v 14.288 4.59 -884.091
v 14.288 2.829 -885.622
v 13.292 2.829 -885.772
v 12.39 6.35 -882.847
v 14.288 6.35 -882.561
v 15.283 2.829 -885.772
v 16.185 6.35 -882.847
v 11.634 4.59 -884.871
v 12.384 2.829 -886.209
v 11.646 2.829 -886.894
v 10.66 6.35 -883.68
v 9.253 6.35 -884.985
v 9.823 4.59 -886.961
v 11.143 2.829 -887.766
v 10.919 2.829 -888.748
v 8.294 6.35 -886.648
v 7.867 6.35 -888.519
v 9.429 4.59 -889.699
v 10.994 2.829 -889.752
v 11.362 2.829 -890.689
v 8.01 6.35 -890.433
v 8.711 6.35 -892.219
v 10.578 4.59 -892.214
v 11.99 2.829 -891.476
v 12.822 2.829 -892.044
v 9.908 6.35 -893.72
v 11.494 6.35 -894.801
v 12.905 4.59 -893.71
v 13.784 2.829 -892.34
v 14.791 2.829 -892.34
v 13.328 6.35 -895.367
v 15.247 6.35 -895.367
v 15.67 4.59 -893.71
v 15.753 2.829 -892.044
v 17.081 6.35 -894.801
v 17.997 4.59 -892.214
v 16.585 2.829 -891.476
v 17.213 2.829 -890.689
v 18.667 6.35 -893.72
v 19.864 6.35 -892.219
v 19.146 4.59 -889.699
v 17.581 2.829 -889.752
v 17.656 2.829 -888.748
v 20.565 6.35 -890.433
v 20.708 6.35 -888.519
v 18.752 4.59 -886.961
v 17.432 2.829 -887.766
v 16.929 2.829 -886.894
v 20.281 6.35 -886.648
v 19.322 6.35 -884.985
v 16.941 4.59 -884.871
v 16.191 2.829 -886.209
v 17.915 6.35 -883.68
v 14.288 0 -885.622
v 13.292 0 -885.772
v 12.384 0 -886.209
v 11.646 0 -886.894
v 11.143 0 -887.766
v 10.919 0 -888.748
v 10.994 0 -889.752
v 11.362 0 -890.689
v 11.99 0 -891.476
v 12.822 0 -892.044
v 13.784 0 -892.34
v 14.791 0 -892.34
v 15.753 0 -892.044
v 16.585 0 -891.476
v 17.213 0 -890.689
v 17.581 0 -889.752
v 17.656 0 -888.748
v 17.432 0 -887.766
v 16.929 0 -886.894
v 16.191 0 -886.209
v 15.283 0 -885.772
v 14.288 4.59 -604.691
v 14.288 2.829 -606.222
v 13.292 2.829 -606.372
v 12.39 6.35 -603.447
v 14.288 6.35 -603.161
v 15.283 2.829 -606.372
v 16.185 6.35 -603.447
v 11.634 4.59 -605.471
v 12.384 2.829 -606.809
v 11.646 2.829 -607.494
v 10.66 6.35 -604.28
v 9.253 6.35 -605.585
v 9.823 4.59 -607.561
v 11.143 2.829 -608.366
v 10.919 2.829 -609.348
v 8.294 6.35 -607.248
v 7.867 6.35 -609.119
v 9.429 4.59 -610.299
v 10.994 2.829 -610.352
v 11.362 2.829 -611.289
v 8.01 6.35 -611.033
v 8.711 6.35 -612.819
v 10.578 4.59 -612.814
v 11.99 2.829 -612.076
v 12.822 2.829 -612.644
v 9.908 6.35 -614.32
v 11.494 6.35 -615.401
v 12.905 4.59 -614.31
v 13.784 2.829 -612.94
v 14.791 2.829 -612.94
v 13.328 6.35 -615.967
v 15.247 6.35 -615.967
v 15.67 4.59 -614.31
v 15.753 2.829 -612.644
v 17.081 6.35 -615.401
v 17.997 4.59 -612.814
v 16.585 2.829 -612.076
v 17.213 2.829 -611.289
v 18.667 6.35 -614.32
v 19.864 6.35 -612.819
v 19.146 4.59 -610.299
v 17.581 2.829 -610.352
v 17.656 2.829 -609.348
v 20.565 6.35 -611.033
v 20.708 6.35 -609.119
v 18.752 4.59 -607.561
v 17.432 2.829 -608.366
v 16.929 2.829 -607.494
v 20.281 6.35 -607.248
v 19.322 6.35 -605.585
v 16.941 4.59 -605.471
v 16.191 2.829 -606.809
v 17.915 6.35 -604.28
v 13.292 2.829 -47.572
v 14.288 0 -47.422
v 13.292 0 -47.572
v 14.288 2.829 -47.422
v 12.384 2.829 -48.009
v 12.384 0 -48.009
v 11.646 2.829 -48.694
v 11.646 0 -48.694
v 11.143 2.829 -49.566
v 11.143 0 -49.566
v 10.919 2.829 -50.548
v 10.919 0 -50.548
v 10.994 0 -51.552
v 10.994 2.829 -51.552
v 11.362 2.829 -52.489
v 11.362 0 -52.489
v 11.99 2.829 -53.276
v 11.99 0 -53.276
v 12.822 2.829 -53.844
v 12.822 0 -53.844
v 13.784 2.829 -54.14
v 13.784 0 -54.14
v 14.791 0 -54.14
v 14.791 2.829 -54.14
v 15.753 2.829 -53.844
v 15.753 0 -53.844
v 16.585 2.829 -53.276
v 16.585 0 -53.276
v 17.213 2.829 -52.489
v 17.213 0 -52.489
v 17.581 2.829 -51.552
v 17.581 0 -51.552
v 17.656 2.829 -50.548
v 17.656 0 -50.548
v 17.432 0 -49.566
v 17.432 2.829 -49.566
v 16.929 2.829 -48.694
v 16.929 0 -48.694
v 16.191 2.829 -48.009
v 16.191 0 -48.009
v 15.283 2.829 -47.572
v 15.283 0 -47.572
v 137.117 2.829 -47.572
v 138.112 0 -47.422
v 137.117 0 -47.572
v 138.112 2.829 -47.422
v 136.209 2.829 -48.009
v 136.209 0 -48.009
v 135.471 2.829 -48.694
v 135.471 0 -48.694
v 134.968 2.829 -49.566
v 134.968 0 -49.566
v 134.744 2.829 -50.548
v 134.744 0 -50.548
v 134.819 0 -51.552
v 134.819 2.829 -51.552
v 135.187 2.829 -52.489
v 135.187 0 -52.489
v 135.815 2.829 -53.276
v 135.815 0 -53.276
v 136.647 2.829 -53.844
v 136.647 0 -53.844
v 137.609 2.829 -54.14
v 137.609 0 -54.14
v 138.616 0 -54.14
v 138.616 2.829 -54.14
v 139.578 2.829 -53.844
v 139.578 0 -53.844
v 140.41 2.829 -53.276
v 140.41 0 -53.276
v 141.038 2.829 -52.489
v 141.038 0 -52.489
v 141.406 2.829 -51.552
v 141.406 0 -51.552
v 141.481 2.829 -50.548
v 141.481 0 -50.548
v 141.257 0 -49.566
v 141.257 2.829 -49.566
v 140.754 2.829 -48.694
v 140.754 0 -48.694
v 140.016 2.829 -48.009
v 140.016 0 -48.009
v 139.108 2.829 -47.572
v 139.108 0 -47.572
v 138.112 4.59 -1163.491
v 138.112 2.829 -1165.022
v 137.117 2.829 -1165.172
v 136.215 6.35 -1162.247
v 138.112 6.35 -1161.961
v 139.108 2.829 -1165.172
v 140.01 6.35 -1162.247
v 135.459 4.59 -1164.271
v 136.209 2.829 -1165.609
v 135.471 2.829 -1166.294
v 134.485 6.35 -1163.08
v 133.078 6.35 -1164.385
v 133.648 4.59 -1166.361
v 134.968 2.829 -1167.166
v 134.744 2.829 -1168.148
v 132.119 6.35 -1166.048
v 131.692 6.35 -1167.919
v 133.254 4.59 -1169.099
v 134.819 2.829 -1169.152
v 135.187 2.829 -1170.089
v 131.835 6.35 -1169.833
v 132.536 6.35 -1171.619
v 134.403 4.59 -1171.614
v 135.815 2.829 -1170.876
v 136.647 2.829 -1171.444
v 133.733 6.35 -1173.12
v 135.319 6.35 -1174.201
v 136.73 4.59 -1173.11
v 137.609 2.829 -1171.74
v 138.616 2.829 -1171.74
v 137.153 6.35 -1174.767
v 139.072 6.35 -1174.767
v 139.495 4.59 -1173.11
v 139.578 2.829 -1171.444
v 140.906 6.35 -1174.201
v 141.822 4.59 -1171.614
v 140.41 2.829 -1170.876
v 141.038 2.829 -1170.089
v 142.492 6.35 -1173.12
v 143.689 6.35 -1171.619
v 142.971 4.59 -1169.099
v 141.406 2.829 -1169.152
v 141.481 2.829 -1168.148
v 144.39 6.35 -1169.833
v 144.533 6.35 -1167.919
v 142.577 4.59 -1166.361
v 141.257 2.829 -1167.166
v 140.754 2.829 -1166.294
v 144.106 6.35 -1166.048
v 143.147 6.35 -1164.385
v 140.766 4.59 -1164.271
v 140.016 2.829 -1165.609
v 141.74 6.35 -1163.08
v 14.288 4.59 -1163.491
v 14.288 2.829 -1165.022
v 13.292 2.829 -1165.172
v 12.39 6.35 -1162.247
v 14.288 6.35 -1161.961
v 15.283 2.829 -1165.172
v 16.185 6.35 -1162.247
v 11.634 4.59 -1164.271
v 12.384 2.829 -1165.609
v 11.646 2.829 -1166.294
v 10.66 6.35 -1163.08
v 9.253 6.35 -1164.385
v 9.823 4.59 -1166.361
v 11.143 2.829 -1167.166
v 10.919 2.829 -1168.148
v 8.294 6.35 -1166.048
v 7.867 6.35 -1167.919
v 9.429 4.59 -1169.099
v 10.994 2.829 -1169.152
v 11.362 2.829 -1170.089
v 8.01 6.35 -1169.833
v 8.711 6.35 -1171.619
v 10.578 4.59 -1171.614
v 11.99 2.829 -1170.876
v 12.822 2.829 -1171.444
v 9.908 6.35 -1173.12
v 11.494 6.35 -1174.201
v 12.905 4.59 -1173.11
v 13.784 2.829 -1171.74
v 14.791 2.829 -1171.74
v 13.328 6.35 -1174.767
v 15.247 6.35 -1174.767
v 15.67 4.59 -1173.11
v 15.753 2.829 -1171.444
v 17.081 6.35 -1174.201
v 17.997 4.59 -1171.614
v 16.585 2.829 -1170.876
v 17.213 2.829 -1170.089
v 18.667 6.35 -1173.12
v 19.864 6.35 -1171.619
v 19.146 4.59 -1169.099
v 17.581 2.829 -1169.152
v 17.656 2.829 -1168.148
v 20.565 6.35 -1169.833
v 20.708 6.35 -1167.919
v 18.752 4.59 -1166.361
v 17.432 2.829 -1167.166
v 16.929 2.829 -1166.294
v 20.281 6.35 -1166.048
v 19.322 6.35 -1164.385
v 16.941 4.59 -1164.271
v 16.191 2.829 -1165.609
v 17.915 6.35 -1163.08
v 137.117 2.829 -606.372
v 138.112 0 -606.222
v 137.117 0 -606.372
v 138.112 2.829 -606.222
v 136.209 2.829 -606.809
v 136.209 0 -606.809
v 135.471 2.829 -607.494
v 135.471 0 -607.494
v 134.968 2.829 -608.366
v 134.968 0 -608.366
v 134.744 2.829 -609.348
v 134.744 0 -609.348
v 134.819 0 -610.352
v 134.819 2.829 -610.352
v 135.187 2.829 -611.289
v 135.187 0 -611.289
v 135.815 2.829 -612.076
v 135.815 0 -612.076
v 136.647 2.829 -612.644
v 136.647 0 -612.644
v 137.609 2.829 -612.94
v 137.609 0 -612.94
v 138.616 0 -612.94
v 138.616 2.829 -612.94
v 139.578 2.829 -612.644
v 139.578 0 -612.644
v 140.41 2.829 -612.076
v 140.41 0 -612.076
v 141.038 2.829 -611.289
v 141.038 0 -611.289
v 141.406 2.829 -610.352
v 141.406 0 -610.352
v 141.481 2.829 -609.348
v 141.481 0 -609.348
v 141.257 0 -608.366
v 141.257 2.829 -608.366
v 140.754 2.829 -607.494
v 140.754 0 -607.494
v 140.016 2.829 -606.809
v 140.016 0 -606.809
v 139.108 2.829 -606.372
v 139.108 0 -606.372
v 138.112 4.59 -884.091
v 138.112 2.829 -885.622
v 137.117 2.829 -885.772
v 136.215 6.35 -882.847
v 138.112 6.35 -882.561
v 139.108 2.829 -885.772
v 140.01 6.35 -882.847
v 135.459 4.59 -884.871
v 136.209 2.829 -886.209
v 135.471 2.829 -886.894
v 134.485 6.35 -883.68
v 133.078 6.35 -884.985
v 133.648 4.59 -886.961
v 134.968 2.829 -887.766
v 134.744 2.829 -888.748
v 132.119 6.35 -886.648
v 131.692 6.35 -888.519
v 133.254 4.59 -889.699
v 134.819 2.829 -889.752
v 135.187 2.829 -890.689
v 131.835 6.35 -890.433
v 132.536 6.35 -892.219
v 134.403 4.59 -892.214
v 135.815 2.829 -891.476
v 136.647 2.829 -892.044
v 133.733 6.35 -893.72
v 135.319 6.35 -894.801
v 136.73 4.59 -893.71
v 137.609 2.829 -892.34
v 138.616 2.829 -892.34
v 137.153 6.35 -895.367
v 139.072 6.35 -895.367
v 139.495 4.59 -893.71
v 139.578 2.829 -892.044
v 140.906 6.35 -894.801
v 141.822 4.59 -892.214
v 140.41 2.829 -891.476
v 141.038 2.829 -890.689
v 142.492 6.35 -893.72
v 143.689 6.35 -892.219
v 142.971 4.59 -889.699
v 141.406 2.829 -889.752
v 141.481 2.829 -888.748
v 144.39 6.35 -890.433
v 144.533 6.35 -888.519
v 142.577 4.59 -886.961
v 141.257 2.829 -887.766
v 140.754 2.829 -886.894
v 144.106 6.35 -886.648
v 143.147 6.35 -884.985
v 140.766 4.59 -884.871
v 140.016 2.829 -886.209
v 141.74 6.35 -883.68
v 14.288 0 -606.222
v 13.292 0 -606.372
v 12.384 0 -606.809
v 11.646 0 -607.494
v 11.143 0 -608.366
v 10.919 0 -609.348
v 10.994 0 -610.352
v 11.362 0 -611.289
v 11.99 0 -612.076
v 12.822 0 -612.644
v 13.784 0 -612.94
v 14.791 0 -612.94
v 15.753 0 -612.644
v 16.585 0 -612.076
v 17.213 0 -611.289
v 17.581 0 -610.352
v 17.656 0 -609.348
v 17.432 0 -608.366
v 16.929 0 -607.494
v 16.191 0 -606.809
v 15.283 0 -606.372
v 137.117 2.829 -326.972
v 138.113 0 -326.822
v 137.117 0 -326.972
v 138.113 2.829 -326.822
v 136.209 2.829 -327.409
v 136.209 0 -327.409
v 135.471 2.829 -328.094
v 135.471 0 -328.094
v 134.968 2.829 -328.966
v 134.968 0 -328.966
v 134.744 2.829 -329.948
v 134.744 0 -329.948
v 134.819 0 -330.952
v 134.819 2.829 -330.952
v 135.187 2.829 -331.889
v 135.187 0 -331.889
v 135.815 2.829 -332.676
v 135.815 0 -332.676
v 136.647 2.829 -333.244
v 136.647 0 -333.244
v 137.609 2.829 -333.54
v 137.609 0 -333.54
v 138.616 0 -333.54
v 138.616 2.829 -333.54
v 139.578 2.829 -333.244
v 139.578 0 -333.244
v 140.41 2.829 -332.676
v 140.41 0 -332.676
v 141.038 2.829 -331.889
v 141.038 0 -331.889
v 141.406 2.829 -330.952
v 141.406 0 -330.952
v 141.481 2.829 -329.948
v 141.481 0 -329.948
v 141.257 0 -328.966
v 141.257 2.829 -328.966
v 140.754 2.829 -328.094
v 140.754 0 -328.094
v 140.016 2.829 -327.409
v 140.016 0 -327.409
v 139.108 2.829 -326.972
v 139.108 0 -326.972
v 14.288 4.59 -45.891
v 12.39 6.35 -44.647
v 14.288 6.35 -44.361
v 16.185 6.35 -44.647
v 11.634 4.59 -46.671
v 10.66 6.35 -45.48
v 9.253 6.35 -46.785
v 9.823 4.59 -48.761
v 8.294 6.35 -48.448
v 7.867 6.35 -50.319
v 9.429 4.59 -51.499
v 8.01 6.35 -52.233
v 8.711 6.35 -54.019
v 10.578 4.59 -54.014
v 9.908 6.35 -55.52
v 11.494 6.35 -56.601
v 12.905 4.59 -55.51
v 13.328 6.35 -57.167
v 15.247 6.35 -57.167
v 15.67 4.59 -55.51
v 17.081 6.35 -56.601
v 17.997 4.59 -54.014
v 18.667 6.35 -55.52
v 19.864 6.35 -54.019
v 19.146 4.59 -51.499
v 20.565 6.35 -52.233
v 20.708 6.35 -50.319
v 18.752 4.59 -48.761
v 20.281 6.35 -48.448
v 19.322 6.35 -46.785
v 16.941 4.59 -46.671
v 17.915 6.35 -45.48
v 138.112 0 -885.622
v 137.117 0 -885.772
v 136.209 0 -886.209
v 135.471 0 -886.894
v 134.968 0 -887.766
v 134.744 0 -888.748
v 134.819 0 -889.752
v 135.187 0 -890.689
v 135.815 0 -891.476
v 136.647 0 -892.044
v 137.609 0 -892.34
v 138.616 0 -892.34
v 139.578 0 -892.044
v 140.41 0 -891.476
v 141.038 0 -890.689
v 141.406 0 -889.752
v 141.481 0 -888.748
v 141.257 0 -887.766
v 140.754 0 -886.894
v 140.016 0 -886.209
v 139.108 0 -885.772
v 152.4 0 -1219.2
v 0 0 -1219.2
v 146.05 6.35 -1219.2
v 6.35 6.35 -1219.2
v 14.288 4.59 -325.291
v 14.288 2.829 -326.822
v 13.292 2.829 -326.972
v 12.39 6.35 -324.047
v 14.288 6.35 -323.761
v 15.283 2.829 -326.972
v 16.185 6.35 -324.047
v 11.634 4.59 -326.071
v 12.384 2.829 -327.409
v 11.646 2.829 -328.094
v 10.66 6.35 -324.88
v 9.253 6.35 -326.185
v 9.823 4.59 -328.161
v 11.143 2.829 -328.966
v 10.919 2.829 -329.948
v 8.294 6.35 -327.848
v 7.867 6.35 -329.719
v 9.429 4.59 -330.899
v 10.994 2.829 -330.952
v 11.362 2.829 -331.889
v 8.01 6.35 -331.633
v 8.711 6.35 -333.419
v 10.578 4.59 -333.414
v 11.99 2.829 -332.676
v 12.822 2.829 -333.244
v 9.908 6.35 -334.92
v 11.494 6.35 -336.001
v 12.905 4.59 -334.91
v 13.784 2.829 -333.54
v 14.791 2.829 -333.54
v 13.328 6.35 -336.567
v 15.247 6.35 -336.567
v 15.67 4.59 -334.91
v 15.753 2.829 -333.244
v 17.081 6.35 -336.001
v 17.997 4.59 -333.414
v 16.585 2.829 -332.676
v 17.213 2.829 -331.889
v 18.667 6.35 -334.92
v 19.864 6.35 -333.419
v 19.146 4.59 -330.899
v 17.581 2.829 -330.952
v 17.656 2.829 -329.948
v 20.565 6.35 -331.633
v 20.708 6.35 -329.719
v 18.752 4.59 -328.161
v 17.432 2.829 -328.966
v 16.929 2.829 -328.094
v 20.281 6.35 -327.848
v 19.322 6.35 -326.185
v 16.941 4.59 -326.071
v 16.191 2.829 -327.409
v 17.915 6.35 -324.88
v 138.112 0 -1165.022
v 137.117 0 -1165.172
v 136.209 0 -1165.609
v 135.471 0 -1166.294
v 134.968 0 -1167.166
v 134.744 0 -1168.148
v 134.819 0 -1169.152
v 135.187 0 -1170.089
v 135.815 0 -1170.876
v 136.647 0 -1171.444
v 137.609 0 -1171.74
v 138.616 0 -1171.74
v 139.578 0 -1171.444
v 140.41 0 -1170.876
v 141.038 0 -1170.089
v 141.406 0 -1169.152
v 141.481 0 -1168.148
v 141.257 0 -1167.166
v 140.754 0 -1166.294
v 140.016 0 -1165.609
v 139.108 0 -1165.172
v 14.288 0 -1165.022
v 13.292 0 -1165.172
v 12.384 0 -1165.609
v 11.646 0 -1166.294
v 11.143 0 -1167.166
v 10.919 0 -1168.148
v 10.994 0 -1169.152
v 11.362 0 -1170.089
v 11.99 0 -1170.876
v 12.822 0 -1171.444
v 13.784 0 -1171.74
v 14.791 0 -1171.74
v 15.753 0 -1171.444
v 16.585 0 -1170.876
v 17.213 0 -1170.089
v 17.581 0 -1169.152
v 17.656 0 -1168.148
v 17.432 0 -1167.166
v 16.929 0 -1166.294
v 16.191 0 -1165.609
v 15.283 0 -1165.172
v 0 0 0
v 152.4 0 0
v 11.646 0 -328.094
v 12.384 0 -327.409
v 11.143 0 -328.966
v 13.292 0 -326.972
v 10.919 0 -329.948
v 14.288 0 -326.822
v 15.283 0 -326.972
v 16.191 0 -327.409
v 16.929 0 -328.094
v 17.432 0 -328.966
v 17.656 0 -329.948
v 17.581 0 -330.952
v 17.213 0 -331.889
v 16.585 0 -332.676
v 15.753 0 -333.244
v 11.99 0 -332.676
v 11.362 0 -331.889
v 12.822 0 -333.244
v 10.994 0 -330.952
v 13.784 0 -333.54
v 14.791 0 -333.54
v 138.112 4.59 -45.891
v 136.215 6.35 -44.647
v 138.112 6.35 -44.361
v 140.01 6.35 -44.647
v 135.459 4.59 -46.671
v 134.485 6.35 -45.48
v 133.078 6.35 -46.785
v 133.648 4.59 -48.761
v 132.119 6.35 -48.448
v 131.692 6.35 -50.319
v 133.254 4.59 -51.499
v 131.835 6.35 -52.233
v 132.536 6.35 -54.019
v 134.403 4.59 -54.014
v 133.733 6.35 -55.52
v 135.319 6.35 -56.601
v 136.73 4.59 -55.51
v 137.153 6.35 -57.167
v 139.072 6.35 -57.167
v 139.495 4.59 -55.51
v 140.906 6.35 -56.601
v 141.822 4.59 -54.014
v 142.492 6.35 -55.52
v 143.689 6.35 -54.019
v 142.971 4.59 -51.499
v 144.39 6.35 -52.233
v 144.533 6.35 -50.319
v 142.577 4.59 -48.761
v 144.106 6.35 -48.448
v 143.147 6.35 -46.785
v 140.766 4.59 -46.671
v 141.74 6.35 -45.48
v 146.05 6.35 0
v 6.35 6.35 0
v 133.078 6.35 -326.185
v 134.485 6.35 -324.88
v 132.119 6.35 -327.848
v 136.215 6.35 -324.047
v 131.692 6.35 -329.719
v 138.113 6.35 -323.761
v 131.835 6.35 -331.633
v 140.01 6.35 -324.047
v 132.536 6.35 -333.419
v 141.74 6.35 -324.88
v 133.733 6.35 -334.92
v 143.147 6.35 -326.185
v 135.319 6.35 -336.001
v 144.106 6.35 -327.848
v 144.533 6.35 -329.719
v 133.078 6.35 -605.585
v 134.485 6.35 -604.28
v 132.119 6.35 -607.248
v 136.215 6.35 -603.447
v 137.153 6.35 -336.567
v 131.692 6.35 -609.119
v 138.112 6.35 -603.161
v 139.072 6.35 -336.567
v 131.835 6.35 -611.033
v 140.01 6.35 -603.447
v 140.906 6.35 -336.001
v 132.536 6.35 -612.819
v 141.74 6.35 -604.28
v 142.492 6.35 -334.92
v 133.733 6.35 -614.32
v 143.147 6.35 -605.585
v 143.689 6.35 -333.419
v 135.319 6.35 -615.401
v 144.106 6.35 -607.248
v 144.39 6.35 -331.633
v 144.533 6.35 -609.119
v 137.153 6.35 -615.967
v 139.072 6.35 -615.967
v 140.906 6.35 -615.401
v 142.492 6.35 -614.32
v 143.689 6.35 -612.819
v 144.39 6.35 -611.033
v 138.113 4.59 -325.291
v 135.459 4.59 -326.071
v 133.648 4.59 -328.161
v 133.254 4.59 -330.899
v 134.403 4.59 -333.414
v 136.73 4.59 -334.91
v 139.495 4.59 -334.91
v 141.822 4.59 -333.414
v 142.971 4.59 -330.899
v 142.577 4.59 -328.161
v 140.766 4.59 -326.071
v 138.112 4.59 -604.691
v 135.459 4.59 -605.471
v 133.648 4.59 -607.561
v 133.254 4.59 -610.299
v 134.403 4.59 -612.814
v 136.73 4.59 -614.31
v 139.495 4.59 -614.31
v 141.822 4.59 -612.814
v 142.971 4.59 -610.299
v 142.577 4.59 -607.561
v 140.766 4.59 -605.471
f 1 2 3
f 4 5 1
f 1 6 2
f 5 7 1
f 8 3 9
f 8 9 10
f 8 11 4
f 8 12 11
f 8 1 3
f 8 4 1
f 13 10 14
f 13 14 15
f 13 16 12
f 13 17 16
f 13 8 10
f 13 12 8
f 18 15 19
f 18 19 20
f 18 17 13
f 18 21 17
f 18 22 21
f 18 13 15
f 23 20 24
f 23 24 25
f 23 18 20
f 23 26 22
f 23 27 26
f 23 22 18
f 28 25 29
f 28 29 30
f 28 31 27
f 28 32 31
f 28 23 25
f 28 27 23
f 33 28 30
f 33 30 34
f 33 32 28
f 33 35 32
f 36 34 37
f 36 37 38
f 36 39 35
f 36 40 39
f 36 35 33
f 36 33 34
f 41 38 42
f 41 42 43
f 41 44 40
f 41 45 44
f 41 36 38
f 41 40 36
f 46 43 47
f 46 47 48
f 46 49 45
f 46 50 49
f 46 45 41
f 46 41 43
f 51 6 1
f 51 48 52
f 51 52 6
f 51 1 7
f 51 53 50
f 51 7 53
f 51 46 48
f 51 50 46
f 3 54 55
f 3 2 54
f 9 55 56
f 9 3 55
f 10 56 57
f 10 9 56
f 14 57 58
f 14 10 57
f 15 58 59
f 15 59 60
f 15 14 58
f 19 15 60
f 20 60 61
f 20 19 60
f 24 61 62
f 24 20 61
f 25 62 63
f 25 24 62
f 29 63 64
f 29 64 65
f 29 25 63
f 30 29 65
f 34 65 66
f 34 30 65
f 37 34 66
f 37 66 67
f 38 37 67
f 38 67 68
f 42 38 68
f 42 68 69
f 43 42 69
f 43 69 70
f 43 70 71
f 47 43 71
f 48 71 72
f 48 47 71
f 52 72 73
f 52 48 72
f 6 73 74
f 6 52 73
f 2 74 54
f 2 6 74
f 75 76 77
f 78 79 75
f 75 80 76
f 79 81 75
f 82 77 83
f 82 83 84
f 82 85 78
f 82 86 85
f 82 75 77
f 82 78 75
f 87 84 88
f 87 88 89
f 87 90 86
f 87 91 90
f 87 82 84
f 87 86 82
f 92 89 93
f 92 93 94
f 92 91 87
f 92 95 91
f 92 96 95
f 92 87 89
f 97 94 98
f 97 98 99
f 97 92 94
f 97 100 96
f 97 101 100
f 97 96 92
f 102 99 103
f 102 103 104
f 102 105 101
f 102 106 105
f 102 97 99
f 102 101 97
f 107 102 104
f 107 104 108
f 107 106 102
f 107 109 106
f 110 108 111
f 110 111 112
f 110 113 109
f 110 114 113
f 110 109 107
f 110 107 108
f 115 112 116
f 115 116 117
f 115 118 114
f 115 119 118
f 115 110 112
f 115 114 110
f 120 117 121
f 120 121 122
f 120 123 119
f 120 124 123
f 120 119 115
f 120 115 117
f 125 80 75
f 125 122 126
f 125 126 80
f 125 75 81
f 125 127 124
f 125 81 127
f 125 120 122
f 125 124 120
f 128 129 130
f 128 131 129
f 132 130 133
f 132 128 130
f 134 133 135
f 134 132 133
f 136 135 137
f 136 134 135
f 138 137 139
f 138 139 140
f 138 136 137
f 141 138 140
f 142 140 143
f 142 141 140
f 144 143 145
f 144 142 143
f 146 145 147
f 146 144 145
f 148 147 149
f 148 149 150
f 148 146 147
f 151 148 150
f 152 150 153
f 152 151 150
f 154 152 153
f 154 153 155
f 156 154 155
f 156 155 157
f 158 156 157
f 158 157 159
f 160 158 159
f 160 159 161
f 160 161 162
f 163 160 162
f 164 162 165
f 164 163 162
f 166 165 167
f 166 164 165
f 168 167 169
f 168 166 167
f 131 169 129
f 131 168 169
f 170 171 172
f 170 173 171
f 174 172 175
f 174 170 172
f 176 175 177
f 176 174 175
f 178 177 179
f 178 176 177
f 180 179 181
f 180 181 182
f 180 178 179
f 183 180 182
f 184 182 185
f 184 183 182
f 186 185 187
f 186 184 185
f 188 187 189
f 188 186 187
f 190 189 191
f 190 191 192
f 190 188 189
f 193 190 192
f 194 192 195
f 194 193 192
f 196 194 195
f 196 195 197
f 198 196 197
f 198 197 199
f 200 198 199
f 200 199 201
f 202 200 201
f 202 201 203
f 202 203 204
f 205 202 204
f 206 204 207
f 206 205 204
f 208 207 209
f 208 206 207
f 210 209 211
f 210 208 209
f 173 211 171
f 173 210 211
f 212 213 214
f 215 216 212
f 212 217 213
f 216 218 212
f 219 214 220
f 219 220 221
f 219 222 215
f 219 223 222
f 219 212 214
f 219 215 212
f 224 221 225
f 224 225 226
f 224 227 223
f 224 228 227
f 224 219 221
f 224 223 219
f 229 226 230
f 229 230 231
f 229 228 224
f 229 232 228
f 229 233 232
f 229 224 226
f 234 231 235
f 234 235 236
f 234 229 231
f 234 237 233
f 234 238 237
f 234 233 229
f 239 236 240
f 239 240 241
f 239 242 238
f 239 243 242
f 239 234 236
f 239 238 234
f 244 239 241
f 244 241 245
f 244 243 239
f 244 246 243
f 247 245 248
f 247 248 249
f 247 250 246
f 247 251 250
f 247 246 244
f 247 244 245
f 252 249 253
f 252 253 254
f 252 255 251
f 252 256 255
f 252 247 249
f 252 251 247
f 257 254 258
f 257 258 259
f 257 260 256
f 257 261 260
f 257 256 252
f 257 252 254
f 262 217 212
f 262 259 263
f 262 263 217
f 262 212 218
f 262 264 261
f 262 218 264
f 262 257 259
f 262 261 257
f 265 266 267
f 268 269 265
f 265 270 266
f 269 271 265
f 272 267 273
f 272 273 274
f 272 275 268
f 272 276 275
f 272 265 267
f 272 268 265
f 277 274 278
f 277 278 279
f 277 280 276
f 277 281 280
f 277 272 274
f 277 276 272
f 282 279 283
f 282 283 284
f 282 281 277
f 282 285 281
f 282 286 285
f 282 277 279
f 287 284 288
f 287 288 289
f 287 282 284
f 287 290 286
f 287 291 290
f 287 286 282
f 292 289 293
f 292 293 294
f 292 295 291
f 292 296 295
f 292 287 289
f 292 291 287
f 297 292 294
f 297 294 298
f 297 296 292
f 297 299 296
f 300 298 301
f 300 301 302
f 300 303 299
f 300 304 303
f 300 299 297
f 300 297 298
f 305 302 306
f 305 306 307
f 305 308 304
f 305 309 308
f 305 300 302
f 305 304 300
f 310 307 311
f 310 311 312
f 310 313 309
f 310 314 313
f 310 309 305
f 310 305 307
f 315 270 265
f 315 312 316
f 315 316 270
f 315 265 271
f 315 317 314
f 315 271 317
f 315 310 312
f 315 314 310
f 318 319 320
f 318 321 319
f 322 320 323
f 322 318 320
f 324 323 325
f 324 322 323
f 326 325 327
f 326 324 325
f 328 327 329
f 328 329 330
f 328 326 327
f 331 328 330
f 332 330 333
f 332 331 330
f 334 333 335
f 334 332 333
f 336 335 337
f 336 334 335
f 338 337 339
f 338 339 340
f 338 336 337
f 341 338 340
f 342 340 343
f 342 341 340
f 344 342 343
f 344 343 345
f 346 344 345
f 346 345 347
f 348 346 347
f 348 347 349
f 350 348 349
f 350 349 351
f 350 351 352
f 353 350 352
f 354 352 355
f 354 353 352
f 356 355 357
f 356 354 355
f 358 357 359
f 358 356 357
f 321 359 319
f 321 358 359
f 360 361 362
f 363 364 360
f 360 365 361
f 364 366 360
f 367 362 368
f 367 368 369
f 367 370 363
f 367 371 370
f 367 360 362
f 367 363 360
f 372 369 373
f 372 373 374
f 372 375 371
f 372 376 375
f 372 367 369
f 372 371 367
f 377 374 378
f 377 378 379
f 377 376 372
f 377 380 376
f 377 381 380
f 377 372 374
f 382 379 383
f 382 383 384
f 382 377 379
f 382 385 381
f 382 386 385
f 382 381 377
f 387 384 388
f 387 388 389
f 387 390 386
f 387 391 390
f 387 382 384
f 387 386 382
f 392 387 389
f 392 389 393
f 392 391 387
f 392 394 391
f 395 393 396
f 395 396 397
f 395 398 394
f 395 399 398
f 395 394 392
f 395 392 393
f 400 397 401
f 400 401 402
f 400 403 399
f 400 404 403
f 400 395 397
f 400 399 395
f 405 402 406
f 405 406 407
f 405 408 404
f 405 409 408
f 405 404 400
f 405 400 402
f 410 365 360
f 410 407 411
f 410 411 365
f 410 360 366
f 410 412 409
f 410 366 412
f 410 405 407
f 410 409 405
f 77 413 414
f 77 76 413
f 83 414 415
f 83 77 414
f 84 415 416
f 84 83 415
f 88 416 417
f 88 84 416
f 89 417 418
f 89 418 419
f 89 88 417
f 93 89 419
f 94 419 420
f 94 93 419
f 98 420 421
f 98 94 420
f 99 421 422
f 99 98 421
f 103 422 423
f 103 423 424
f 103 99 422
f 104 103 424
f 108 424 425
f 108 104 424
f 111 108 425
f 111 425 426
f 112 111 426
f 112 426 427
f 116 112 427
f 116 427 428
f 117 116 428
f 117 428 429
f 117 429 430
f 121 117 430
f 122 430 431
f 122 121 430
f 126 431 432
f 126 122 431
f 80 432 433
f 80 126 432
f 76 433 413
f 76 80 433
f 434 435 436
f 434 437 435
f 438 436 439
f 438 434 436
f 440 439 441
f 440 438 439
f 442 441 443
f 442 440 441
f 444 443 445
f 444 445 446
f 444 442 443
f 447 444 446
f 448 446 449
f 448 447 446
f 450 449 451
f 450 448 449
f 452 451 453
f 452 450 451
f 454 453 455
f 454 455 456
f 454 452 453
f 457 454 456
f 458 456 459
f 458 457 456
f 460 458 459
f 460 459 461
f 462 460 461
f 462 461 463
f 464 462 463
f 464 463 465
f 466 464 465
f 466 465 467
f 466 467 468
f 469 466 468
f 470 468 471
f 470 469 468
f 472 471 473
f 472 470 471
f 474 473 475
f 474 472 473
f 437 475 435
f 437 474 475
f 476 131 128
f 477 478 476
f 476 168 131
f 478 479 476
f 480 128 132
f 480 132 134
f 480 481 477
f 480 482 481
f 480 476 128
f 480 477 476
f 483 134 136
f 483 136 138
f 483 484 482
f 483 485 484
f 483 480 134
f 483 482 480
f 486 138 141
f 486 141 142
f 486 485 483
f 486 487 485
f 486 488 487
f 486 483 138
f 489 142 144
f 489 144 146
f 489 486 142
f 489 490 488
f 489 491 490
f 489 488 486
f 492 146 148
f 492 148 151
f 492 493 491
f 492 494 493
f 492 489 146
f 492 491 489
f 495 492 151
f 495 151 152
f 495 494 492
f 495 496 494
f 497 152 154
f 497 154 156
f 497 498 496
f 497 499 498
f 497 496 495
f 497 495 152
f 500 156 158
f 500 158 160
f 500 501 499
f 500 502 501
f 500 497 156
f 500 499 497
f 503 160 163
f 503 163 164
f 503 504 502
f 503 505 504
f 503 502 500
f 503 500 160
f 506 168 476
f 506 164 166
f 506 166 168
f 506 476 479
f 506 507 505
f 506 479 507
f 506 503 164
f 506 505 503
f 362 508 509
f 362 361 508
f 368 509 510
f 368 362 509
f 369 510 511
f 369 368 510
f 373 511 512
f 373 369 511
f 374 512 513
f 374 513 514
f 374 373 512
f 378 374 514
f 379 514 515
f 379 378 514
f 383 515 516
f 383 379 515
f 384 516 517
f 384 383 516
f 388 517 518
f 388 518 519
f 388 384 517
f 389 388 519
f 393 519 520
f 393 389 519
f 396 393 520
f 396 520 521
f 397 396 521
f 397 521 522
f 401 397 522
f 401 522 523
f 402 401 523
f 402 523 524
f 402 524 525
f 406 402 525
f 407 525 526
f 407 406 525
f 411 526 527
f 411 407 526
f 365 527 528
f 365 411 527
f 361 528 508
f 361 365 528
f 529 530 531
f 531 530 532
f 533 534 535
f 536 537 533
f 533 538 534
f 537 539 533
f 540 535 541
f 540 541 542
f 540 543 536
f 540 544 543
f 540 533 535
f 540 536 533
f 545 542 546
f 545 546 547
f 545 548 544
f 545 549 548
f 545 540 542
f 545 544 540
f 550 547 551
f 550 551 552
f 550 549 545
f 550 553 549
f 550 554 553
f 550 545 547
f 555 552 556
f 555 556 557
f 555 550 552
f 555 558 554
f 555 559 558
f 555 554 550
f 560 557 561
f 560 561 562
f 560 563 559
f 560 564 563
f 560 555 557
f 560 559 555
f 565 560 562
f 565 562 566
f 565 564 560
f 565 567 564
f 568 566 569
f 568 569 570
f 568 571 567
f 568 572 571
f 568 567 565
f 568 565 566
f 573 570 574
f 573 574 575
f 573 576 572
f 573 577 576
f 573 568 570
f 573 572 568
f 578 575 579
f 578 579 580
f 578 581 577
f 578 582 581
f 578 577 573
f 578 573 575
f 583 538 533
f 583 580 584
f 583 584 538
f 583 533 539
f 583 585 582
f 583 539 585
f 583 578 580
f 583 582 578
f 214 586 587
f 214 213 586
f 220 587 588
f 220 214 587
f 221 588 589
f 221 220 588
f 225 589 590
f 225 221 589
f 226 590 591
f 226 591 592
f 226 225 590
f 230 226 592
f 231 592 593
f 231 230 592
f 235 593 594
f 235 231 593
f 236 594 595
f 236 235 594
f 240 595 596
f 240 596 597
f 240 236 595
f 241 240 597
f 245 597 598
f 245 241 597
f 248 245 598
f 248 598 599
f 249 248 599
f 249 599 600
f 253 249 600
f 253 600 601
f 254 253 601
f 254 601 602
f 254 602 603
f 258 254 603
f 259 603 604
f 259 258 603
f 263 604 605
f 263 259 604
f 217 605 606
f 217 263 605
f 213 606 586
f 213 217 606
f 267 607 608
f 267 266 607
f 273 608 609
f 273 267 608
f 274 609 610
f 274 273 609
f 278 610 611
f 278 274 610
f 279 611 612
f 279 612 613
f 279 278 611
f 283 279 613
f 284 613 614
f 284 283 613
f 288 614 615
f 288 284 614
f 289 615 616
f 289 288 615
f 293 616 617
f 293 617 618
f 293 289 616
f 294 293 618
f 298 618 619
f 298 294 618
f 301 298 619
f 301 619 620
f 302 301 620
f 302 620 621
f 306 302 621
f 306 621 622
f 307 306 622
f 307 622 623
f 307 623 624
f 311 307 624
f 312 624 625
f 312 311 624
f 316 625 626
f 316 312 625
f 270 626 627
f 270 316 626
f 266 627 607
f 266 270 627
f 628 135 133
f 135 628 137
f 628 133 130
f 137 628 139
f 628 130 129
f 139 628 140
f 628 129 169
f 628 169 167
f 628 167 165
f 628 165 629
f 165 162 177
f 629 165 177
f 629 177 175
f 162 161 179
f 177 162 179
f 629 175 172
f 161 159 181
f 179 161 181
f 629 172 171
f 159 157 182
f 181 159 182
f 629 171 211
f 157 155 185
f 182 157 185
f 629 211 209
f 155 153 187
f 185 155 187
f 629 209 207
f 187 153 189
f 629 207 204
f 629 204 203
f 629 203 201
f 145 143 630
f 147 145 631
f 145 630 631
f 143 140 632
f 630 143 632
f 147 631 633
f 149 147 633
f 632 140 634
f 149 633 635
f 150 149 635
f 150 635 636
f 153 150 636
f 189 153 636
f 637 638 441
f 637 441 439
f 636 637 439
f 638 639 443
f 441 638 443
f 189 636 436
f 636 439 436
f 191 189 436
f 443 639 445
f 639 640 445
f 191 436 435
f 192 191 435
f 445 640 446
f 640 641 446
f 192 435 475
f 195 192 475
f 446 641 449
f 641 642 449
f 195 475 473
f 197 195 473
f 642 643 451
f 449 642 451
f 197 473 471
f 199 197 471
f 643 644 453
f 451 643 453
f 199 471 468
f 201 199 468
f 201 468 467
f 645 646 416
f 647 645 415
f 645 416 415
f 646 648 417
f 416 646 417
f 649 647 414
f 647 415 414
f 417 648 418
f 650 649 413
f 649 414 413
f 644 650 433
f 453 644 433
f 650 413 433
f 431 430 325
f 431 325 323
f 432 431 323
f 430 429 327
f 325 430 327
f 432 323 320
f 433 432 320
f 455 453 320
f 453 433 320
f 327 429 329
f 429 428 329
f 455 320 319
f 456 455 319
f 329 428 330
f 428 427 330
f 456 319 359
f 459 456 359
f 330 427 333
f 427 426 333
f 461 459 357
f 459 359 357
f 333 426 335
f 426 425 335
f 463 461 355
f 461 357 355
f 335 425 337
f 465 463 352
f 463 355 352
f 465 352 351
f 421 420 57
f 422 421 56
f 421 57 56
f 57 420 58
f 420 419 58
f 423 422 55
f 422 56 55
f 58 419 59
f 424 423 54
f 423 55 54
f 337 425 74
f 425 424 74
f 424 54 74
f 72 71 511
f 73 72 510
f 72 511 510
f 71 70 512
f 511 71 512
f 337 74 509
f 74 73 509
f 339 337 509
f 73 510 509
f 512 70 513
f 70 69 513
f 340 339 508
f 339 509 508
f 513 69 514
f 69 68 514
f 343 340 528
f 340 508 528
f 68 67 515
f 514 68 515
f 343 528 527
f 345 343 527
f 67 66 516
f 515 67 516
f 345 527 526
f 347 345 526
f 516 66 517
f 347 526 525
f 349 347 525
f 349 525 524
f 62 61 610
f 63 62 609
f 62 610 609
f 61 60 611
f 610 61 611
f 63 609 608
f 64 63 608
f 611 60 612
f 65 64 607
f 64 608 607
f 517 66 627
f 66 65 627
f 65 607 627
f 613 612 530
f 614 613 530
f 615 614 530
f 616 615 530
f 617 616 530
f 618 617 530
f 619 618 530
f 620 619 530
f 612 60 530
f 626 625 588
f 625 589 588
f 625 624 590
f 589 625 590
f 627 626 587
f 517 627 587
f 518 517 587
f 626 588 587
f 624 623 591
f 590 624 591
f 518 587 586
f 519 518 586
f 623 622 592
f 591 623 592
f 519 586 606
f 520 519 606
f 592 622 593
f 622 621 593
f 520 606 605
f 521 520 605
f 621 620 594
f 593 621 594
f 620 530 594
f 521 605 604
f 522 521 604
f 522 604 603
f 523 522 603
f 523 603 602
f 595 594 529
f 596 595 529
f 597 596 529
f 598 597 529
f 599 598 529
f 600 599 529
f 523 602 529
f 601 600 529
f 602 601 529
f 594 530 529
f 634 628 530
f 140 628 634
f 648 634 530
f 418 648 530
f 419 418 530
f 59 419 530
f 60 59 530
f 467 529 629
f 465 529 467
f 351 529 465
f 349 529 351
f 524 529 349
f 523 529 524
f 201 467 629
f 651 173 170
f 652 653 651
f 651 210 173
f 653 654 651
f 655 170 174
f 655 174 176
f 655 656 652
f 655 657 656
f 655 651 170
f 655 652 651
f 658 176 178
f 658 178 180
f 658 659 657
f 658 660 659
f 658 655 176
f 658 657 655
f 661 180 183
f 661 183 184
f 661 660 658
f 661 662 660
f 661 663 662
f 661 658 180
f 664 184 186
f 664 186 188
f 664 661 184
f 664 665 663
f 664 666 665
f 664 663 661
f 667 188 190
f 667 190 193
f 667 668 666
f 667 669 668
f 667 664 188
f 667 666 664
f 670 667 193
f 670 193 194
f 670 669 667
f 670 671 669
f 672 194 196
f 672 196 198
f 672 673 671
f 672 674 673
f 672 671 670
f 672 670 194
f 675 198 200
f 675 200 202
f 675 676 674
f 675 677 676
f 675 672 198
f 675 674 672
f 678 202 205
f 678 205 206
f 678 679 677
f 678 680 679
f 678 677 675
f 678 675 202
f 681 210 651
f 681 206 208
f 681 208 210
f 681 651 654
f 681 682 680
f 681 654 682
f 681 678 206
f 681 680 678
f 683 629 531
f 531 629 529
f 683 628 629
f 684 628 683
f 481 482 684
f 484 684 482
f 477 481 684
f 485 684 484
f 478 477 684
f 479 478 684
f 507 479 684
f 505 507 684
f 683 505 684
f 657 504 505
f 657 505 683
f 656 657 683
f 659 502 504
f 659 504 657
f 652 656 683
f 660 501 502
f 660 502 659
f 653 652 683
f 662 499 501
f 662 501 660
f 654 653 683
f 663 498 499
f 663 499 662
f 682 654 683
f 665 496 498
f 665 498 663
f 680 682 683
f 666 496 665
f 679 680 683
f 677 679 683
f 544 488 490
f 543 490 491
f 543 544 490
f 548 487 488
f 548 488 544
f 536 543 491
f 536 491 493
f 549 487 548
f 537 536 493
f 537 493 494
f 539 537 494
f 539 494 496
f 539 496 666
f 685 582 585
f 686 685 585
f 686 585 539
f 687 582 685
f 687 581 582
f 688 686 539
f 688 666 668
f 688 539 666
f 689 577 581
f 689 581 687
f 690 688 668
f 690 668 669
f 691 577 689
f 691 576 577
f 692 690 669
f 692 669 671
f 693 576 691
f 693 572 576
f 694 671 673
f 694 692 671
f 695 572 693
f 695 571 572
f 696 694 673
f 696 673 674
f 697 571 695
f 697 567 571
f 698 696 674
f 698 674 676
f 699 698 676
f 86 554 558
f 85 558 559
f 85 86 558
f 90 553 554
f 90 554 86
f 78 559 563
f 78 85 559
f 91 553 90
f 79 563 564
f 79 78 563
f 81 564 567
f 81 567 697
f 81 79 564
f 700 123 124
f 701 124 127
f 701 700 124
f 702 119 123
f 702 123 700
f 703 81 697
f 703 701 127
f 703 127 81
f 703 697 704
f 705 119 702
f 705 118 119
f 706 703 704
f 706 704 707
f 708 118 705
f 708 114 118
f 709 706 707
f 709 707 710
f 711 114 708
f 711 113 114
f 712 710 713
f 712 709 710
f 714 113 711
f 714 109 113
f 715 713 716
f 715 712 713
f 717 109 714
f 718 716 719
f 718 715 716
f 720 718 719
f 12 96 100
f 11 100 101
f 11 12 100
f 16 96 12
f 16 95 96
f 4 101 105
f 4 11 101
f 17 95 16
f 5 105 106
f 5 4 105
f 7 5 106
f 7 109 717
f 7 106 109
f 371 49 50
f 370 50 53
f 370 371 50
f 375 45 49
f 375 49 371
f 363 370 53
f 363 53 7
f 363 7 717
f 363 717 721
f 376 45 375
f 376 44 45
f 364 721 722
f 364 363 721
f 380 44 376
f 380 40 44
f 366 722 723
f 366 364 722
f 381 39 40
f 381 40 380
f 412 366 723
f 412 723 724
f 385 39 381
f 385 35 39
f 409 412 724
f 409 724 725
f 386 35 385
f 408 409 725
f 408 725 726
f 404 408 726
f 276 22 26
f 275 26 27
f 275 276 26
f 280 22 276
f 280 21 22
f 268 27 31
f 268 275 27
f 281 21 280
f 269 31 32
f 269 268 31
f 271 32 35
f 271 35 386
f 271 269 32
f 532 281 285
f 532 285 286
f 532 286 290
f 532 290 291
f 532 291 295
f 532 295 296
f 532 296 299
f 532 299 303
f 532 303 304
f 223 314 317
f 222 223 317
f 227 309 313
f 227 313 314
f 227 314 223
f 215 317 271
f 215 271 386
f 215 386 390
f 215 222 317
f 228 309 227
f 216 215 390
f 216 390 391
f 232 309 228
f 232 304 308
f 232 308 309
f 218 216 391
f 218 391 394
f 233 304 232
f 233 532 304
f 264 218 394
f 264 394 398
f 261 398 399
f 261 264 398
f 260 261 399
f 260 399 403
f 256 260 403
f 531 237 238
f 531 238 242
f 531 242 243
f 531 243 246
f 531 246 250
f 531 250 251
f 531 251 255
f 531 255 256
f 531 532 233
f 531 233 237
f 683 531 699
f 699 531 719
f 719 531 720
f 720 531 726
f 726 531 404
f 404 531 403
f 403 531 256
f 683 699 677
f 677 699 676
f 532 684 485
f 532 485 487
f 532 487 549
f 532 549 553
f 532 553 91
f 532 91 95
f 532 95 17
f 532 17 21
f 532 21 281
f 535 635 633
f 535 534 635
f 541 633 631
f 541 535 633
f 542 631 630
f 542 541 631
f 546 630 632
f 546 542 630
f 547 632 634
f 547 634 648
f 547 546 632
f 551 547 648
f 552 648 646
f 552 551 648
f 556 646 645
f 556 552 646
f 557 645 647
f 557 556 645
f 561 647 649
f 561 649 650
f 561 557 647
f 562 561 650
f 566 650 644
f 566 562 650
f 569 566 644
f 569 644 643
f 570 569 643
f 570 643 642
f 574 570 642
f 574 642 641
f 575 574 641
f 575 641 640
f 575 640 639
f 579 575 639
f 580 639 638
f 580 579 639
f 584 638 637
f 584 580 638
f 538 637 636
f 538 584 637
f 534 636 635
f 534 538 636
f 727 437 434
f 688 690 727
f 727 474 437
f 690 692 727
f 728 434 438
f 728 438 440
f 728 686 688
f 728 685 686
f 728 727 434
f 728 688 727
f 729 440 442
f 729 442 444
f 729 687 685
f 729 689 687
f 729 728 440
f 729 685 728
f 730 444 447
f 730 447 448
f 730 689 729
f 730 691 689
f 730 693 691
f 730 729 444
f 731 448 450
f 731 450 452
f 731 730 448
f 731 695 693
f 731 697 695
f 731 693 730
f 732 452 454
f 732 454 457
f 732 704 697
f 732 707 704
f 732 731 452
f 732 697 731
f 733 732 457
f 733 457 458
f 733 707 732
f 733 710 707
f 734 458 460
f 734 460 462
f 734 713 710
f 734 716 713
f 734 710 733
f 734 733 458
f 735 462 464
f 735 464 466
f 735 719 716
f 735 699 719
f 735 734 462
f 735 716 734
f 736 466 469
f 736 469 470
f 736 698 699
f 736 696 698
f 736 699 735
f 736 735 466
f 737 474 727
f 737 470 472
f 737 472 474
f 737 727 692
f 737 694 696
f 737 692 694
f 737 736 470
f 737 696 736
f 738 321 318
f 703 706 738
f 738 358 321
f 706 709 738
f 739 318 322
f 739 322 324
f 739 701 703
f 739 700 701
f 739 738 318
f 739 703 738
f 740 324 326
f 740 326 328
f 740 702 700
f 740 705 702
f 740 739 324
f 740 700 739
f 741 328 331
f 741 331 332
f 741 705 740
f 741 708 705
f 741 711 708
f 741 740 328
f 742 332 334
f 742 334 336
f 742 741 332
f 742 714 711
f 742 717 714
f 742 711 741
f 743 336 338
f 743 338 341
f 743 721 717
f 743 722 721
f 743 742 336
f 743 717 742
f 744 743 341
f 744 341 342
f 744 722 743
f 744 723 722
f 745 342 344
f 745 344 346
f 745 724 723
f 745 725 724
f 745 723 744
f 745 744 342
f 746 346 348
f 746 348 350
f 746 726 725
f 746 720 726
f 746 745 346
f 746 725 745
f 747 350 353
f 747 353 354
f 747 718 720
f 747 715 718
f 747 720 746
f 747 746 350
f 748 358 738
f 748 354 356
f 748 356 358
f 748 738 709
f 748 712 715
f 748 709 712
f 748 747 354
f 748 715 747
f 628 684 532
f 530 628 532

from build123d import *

# Parameters (mm, degrees)
SKETCH1_W                                     = 152.4
SKETCH1_H                                     = 1219.2
BOSS_EXTRUDE1_DEPTH                           = 6.35
CSK_FOR_1_4_FLAT_HEAD_MACHINE_SCREW1_AT_COUNT = 2
CSK_FOR_1_4_FLAT_HEAD_MACHINE_SCREW1_AT_PITCH = 123.825
CSK_FOR_1_4_FLAT_HEAD_MACHINE_SCREW1_2_COUNT  = 2
CSK_FOR_1_4_FLAT_HEAD_MACHINE_SCREW1_2_PITCH  = 305.609212271
CSK_FOR_1_4_FLAT_HEAD_MACHINE_SCREW1_3_COUNT  = 2
CSK_FOR_1_4_FLAT_HEAD_MACHINE_SCREW1_3_PITCH  = 572.354846773
CSK_FOR_1_4_FLAT_HEAD_MACHINE_SCREW1_4_COUNT  = 2
CSK_FOR_1_4_FLAT_HEAD_MACHINE_SCREW1_4_PITCH  = 847.296801968
CSK_FOR_1_4_FLAT_HEAD_MACHINE_SCREW1_5_COUNT  = 2
CSK_FOR_1_4_FLAT_HEAD_MACHINE_SCREW1_5_PITCH  = 1124.438700252
CSK_FOR_1_4_FLAT_HEAD_MACHINE_SCREW1_6_COUNT  = 2
CSK_FOR_1_4_FLAT_HEAD_MACHINE_SCREW1_6_PITCH  = 279.4
CSK_FOR_1_4_FLAT_HEAD_MACHINE_SCREW1_7_COUNT  = 2
CSK_FOR_1_4_FLAT_HEAD_MACHINE_SCREW1_7_PITCH  = 558.8
CSK_FOR_1_4_FLAT_HEAD_MACHINE_SCREW1_8_COUNT  = 2
CSK_FOR_1_4_FLAT_HEAD_MACHINE_SCREW1_8_PITCH  = 838.2
CSK_FOR_1_4_FLAT_HEAD_MACHINE_SCREW1_9_COUNT  = 2
CSK_FOR_1_4_FLAT_HEAD_MACHINE_SCREW1_9_PITCH  = 1117.6
CHAMFER1_SIZE                                 = 6.35


with BuildPart() as part:
    # Sketch1 → Boss-Extrude1 (new body)
    with BuildSketch(Plane(origin=(0, 0, 0), x_dir=(1, 0, 0), z_dir=(0, 1, 0))):
        with Locations((76.2, 609.6)):
            Rectangle(SKETCH1_W, SKETCH1_H)
    extrude(amount=BOSS_EXTRUDE1_DEPTH)

    # Sketch3 → CSK for 1/4 Flat Head Machine Screw1 (revolve, cut)
    with BuildSketch(Plane(origin=(14.2875, 6.35, -1168.4), x_dir=(0, 0, 1), z_dir=(1, 0, 0))):
        Polygon((0, 0), (0, 6.35), (3.3782, 6.35), (3.3782, 3.520932584), (6.4389, 0), align=None)
    csk_for_1_4_flat_head_machine_screw1 = revolve(axis=Axis((14.2875, 12.7, -1168.4), (0, -1, 0)), mode=Mode.SUBTRACT)

    # CSK for 1/4 Flat Head Machine Screw1 at: CSK for 1/4 Flat Head Machine Screw1 ×2
    with Locations(*[(i * CSK_FOR_1_4_FLAT_HEAD_MACHINE_SCREW1_AT_PITCH, 0, 0) for i in range(1, CSK_FOR_1_4_FLAT_HEAD_MACHINE_SCREW1_AT_COUNT)]):
        add(csk_for_1_4_flat_head_machine_screw1, mode=Mode.SUBTRACT)

    # CSK for 1_4 Flat Head Machine Screw1 2: CSK for 1/4 Flat Head Machine Screw1 ×2
    with Locations(*[Vector(0.405174304399354, 0, 0.9142394560805718) * (i * CSK_FOR_1_4_FLAT_HEAD_MACHINE_SCREW1_2_PITCH) for i in range(1, CSK_FOR_1_4_FLAT_HEAD_MACHINE_SCREW1_2_COUNT)]):
        add(csk_for_1_4_flat_head_machine_screw1, mode=Mode.SUBTRACT)

    # CSK for 1_4 Flat Head Machine Screw1 3: CSK for 1/4 Flat Head Machine Screw1 ×2
    with Locations(*[Vector(0.21634306182267615, 0, 0.9763174071997232) * (i * CSK_FOR_1_4_FLAT_HEAD_MACHINE_SCREW1_3_PITCH) for i in range(1, CSK_FOR_1_4_FLAT_HEAD_MACHINE_SCREW1_3_COUNT)]):
        add(csk_for_1_4_flat_head_machine_screw1, mode=Mode.SUBTRACT)

    # CSK for 1_4 Flat Head Machine Screw1 4: CSK for 1/4 Flat Head Machine Screw1 ×2
    with Locations(*[Vector(0.1461412337594335, 0, 0.9892637362176331) * (i * CSK_FOR_1_4_FLAT_HEAD_MACHINE_SCREW1_4_PITCH) for i in range(1, CSK_FOR_1_4_FLAT_HEAD_MACHINE_SCREW1_4_COUNT)]):
        add(csk_for_1_4_flat_head_machine_screw1, mode=Mode.SUBTRACT)

    # CSK for 1_4 Flat Head Machine Screw1 5: CSK for 1/4 Flat Head Machine Screw1 ×2
    with Locations(*[Vector(0.11012160998392527, 0, 0.9939181208804618) * (i * CSK_FOR_1_4_FLAT_HEAD_MACHINE_SCREW1_5_PITCH) for i in range(1, CSK_FOR_1_4_FLAT_HEAD_MACHINE_SCREW1_5_COUNT)]):
        add(csk_for_1_4_flat_head_machine_screw1, mode=Mode.SUBTRACT)

    # CSK for 1_4 Flat Head Machine Screw1 6: CSK for 1/4 Flat Head Machine Screw1 ×2
    with Locations(*[(0, 0, i * CSK_FOR_1_4_FLAT_HEAD_MACHINE_SCREW1_6_PITCH) for i in range(1, CSK_FOR_1_4_FLAT_HEAD_MACHINE_SCREW1_6_COUNT)]):
        add(csk_for_1_4_flat_head_machine_screw1, mode=Mode.SUBTRACT)

    # CSK for 1_4 Flat Head Machine Screw1 7: CSK for 1/4 Flat Head Machine Screw1 ×2
    with Locations(*[(0, 0, i * CSK_FOR_1_4_FLAT_HEAD_MACHINE_SCREW1_7_PITCH) for i in range(1, CSK_FOR_1_4_FLAT_HEAD_MACHINE_SCREW1_7_COUNT)]):
        add(csk_for_1_4_flat_head_machine_screw1, mode=Mode.SUBTRACT)

    # CSK for 1_4 Flat Head Machine Screw1 8: CSK for 1/4 Flat Head Machine Screw1 ×2
    with Locations(*[(0, 0, i * CSK_FOR_1_4_FLAT_HEAD_MACHINE_SCREW1_8_PITCH) for i in range(1, CSK_FOR_1_4_FLAT_HEAD_MACHINE_SCREW1_8_COUNT)]):
        add(csk_for_1_4_flat_head_machine_screw1, mode=Mode.SUBTRACT)

    # CSK for 1_4 Flat Head Machine Screw1 9: CSK for 1/4 Flat Head Machine Screw1 ×2
    with Locations(*[(0, 0, i * CSK_FOR_1_4_FLAT_HEAD_MACHINE_SCREW1_9_PITCH) for i in range(1, CSK_FOR_1_4_FLAT_HEAD_MACHINE_SCREW1_9_COUNT)]):
        add(csk_for_1_4_flat_head_machine_screw1, mode=Mode.SUBTRACT)

    # Chamfer1
    chamfer1_edges = [part.edges().sort_by_distance(p)[0] for p in [
        (0, 6.35, -609.6),
        (152.4, 6.35, -609.6),
    ]]
    chamfer(chamfer1_edges, length=CHAMFER1_SIZE - 0.0001)  # a hair under: the kernel refuses the full size


solid = part.part
